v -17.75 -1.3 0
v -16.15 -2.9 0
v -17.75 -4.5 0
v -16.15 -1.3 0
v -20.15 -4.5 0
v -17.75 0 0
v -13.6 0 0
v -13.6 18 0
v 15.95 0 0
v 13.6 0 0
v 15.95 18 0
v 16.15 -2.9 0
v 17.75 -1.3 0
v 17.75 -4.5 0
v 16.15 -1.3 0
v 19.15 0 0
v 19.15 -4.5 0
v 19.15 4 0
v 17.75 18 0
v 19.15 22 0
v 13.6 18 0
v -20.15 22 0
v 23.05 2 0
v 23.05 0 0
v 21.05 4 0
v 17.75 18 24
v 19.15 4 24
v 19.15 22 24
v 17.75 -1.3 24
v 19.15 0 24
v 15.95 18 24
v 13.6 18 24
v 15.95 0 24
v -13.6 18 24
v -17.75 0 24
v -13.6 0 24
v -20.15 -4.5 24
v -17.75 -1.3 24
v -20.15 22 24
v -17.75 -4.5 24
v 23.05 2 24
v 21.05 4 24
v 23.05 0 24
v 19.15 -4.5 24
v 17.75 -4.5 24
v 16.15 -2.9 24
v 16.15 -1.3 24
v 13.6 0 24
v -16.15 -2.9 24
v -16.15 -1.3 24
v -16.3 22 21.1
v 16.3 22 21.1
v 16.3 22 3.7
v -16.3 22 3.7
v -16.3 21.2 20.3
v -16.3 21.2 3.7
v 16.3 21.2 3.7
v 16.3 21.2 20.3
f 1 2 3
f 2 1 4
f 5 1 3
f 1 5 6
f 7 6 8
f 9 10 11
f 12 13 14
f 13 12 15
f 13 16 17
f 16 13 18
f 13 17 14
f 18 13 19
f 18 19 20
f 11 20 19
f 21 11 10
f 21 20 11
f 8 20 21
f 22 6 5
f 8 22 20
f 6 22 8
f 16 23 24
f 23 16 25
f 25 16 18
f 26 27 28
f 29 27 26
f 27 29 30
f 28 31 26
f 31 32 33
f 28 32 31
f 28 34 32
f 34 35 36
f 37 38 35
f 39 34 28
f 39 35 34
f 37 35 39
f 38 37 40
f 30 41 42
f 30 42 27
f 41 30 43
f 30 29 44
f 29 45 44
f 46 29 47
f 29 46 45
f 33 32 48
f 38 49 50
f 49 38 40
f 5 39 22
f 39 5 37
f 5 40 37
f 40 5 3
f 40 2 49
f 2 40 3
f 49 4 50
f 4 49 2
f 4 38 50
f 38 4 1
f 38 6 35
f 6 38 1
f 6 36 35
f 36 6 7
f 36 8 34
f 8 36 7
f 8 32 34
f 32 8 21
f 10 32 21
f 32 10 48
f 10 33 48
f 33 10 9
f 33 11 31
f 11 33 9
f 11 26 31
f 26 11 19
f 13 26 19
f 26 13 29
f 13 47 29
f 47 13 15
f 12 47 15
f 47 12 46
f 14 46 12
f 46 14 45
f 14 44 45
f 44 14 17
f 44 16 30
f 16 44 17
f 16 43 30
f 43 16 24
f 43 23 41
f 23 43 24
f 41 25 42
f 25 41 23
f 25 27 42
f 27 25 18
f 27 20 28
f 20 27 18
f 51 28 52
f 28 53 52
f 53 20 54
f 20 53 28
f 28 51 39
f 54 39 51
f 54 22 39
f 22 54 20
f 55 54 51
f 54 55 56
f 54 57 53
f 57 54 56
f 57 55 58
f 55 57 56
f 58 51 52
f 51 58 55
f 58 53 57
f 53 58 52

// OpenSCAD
// DIN rail label holder with a recessed bed for an adhesive paper label.
// PETG recommended. Print exactly as shown, flat cross-section on Z=0;
// no supports, 0.2 mm layers, at least 4 perimeters, latch gap kept clear.
// Apply a label to the front recess (normal to Y). Default label: 32 x 16 mm.
// A 45-degree pocket roof avoids an unsupported lip in this orientation.
// Fits TS35 / EN 60715 / IEC 60715 top-hat rail, 7.5 or 15 mm deep.
// Default interface: 35 mm overall, 1 mm flange; rail_inner locates the seats.
// Depth does not enter the fit: only the outer flange edges are gripped.
// For 1.5 mm sheet (e.g. TS35 x 15), set flange_thickness = 1.5.
// Nominal fit: 0.30 mm TOTAL slot play, 0.25 mm at each outer edge,
// and 1.35 mm retaining overlap per lip (hook_overlap - edge_clearance).
// The beam deflects during engagement; the seated rail has clearance,
// not spring preload. Use rail end stops where sliding must be prevented.
// Checked on the dev server with separate 7.5/1 and 15/1.5 mm rail sections;
// geometry checks do not establish printed spring strength or fatigue life.
// Hook the rigid left lip first, then press the right ramp over the rail.
// Pull the right-hand tab outward to release; do not bend the whole carrier.
// Original geometry; fit-test the clip before fitting electronics.
// Rail references:
// https://eshop.weidmueller.com/en/ts-35x7-5ll-1mstzn/p/0514510000
// https://assets.dam.weidmueller.com/assets/api/ab2b4e3c-189d-4eae-b435-7c5a77e1ac25/Original/MB_BUILDING_EN_2025_WEB.pdf

/* [Label] */
label_width = 32; // Adhesive label width across rail, mm [24:1:34]
label_height = 16; // Adhesive label height along rail, mm [10:1:18]
recess_depth = 0.8; // Label recess into the mounting face, mm [0.4:0.2:1.2]
label_clearance = 0.3; // Clearance around label edges, mm [0.2:0.1:0.4]

/* [Rail fit] */
rail_width = 35; // Outside flange width, mm [34.8:0.1:35.2]
rail_inner = 25; // Seat-position reference; need not match the rail web, mm [24:0.5:27]
flange_thickness = 1; // Measured sheet thickness, mm [1:0.1:1.5]
fit_clearance = 0.3; // Total flange slot clearance, mm [0.2:0.05:0.4]
edge_clearance = 0.25; // Clearance at each outer rail edge, mm [0.2:0.05:0.4]
spring_wall = 1.4; // Flexible beam thickness, mm [1.2:0.1:1.6]
spring_length = 18; // Beam root distance above the rail face, mm [18:1:24]
hook_overlap = 1.6; // Tooth reach inward from the side wall, mm [1.4:0.1:1.8]
clip_width = 24; // Contact length along the rail, mm [24:2:32]
bridge_thickness = 4; // Front mounting bridge thickness, mm [3:0.5:5]

/* [Hidden] */
$fn = 24; // Facets per circular hole / standoff
cut_extra = 0.1; // Boolean cutter overlap, mm
rigid_wall = 2.4; // Rigid hook side wall thickness, mm
tooth_thickness = 1.6; // Minimum retaining lip thickness, mm
seat_gap = 1.8; // Air gap beside the spring, mm
edge = rail_width/2 + edge_clearance; // Outer side-wall datum, mm
slot = flange_thickness + fit_clearance; // Flange capture slot height, mm
front = spring_length + bridge_thickness; // Mounting face Y coordinate, mm
seat_inner = rail_inner/2 + 1.1; // Keep seats outside the inner opening, mm
seat_outer = edge - seat_gap; // Spring-side rigid seat outer edge, mm

// Cross-section lies in XY. Rail length is Z; rail front is Y=0.
// All material below Y=0 stays within the outer 1.8 mm of each flange.
// The independent right beam flexes in XY, along continuous print layers.
module clip_profile() {
    union() {
        translate([-edge-rigid_wall,spring_length])
            square([2*edge+rigid_wall+spring_wall,bridge_thickness]);
        // Rigid side and the left flange's front seat.
        translate([-edge-rigid_wall,0])
            square([edge+rigid_wall-seat_inner,spring_length+0.1]);
        polygon([[-edge-rigid_wall,0],[-edge,0],[-edge,-slot],
                 [-edge+hook_overlap,-slot],
                 [-edge+hook_overlap,-slot-tooth_thickness],
                 [-edge,-slot-tooth_thickness-hook_overlap],
                 [-edge-rigid_wall,-slot-tooth_thickness-hook_overlap]]);
        // Right seat is separated from the beam all the way to its root.
        translate([seat_inner,0])
            square([seat_outer-seat_inner,spring_length+0.1]);
        polygon([[edge,-slot-tooth_thickness-hook_overlap],
                 [edge+spring_wall,-slot-tooth_thickness-hook_overlap],
                 [edge+spring_wall,spring_length+0.1],
                 [edge,spring_length+0.1],[edge,-slot],
                 [edge-hook_overlap,-slot],
                 [edge-hook_overlap,-slot-tooth_thickness]]);
        // Solid thumb / screwdriver tab, with a chamfered outside corner.
        translate([edge+spring_wall-0.1,0])
            polygon([[0,0],[4,0],[4,2],[2,4],[0,4]]);
    }
}

// The cutter is drawn in its local (Y,Z) plane and extruded across X.
// The top rises toward the front at 45 degrees, so each new layer is supported.
module label_pocket() {
    pocket_half = (label_width+2*label_clearance)/2;
    bottom = (clip_width-label_height)/2-label_clearance;
    top = (clip_width+label_height)/2+label_clearance;
    translate([-pocket_half,0,0])
        rotate([90,0,90])
            linear_extrude(2*pocket_half)
                polygon([[front-recess_depth,bottom],
                         [front+cut_extra,bottom],
                         [front+cut_extra,top+recess_depth+cut_extra],
                         [front-recess_depth,top]]);
}

color("#f0965a") difference() {
    linear_extrude(clip_width) clip_profile();
    label_pocket();
}
